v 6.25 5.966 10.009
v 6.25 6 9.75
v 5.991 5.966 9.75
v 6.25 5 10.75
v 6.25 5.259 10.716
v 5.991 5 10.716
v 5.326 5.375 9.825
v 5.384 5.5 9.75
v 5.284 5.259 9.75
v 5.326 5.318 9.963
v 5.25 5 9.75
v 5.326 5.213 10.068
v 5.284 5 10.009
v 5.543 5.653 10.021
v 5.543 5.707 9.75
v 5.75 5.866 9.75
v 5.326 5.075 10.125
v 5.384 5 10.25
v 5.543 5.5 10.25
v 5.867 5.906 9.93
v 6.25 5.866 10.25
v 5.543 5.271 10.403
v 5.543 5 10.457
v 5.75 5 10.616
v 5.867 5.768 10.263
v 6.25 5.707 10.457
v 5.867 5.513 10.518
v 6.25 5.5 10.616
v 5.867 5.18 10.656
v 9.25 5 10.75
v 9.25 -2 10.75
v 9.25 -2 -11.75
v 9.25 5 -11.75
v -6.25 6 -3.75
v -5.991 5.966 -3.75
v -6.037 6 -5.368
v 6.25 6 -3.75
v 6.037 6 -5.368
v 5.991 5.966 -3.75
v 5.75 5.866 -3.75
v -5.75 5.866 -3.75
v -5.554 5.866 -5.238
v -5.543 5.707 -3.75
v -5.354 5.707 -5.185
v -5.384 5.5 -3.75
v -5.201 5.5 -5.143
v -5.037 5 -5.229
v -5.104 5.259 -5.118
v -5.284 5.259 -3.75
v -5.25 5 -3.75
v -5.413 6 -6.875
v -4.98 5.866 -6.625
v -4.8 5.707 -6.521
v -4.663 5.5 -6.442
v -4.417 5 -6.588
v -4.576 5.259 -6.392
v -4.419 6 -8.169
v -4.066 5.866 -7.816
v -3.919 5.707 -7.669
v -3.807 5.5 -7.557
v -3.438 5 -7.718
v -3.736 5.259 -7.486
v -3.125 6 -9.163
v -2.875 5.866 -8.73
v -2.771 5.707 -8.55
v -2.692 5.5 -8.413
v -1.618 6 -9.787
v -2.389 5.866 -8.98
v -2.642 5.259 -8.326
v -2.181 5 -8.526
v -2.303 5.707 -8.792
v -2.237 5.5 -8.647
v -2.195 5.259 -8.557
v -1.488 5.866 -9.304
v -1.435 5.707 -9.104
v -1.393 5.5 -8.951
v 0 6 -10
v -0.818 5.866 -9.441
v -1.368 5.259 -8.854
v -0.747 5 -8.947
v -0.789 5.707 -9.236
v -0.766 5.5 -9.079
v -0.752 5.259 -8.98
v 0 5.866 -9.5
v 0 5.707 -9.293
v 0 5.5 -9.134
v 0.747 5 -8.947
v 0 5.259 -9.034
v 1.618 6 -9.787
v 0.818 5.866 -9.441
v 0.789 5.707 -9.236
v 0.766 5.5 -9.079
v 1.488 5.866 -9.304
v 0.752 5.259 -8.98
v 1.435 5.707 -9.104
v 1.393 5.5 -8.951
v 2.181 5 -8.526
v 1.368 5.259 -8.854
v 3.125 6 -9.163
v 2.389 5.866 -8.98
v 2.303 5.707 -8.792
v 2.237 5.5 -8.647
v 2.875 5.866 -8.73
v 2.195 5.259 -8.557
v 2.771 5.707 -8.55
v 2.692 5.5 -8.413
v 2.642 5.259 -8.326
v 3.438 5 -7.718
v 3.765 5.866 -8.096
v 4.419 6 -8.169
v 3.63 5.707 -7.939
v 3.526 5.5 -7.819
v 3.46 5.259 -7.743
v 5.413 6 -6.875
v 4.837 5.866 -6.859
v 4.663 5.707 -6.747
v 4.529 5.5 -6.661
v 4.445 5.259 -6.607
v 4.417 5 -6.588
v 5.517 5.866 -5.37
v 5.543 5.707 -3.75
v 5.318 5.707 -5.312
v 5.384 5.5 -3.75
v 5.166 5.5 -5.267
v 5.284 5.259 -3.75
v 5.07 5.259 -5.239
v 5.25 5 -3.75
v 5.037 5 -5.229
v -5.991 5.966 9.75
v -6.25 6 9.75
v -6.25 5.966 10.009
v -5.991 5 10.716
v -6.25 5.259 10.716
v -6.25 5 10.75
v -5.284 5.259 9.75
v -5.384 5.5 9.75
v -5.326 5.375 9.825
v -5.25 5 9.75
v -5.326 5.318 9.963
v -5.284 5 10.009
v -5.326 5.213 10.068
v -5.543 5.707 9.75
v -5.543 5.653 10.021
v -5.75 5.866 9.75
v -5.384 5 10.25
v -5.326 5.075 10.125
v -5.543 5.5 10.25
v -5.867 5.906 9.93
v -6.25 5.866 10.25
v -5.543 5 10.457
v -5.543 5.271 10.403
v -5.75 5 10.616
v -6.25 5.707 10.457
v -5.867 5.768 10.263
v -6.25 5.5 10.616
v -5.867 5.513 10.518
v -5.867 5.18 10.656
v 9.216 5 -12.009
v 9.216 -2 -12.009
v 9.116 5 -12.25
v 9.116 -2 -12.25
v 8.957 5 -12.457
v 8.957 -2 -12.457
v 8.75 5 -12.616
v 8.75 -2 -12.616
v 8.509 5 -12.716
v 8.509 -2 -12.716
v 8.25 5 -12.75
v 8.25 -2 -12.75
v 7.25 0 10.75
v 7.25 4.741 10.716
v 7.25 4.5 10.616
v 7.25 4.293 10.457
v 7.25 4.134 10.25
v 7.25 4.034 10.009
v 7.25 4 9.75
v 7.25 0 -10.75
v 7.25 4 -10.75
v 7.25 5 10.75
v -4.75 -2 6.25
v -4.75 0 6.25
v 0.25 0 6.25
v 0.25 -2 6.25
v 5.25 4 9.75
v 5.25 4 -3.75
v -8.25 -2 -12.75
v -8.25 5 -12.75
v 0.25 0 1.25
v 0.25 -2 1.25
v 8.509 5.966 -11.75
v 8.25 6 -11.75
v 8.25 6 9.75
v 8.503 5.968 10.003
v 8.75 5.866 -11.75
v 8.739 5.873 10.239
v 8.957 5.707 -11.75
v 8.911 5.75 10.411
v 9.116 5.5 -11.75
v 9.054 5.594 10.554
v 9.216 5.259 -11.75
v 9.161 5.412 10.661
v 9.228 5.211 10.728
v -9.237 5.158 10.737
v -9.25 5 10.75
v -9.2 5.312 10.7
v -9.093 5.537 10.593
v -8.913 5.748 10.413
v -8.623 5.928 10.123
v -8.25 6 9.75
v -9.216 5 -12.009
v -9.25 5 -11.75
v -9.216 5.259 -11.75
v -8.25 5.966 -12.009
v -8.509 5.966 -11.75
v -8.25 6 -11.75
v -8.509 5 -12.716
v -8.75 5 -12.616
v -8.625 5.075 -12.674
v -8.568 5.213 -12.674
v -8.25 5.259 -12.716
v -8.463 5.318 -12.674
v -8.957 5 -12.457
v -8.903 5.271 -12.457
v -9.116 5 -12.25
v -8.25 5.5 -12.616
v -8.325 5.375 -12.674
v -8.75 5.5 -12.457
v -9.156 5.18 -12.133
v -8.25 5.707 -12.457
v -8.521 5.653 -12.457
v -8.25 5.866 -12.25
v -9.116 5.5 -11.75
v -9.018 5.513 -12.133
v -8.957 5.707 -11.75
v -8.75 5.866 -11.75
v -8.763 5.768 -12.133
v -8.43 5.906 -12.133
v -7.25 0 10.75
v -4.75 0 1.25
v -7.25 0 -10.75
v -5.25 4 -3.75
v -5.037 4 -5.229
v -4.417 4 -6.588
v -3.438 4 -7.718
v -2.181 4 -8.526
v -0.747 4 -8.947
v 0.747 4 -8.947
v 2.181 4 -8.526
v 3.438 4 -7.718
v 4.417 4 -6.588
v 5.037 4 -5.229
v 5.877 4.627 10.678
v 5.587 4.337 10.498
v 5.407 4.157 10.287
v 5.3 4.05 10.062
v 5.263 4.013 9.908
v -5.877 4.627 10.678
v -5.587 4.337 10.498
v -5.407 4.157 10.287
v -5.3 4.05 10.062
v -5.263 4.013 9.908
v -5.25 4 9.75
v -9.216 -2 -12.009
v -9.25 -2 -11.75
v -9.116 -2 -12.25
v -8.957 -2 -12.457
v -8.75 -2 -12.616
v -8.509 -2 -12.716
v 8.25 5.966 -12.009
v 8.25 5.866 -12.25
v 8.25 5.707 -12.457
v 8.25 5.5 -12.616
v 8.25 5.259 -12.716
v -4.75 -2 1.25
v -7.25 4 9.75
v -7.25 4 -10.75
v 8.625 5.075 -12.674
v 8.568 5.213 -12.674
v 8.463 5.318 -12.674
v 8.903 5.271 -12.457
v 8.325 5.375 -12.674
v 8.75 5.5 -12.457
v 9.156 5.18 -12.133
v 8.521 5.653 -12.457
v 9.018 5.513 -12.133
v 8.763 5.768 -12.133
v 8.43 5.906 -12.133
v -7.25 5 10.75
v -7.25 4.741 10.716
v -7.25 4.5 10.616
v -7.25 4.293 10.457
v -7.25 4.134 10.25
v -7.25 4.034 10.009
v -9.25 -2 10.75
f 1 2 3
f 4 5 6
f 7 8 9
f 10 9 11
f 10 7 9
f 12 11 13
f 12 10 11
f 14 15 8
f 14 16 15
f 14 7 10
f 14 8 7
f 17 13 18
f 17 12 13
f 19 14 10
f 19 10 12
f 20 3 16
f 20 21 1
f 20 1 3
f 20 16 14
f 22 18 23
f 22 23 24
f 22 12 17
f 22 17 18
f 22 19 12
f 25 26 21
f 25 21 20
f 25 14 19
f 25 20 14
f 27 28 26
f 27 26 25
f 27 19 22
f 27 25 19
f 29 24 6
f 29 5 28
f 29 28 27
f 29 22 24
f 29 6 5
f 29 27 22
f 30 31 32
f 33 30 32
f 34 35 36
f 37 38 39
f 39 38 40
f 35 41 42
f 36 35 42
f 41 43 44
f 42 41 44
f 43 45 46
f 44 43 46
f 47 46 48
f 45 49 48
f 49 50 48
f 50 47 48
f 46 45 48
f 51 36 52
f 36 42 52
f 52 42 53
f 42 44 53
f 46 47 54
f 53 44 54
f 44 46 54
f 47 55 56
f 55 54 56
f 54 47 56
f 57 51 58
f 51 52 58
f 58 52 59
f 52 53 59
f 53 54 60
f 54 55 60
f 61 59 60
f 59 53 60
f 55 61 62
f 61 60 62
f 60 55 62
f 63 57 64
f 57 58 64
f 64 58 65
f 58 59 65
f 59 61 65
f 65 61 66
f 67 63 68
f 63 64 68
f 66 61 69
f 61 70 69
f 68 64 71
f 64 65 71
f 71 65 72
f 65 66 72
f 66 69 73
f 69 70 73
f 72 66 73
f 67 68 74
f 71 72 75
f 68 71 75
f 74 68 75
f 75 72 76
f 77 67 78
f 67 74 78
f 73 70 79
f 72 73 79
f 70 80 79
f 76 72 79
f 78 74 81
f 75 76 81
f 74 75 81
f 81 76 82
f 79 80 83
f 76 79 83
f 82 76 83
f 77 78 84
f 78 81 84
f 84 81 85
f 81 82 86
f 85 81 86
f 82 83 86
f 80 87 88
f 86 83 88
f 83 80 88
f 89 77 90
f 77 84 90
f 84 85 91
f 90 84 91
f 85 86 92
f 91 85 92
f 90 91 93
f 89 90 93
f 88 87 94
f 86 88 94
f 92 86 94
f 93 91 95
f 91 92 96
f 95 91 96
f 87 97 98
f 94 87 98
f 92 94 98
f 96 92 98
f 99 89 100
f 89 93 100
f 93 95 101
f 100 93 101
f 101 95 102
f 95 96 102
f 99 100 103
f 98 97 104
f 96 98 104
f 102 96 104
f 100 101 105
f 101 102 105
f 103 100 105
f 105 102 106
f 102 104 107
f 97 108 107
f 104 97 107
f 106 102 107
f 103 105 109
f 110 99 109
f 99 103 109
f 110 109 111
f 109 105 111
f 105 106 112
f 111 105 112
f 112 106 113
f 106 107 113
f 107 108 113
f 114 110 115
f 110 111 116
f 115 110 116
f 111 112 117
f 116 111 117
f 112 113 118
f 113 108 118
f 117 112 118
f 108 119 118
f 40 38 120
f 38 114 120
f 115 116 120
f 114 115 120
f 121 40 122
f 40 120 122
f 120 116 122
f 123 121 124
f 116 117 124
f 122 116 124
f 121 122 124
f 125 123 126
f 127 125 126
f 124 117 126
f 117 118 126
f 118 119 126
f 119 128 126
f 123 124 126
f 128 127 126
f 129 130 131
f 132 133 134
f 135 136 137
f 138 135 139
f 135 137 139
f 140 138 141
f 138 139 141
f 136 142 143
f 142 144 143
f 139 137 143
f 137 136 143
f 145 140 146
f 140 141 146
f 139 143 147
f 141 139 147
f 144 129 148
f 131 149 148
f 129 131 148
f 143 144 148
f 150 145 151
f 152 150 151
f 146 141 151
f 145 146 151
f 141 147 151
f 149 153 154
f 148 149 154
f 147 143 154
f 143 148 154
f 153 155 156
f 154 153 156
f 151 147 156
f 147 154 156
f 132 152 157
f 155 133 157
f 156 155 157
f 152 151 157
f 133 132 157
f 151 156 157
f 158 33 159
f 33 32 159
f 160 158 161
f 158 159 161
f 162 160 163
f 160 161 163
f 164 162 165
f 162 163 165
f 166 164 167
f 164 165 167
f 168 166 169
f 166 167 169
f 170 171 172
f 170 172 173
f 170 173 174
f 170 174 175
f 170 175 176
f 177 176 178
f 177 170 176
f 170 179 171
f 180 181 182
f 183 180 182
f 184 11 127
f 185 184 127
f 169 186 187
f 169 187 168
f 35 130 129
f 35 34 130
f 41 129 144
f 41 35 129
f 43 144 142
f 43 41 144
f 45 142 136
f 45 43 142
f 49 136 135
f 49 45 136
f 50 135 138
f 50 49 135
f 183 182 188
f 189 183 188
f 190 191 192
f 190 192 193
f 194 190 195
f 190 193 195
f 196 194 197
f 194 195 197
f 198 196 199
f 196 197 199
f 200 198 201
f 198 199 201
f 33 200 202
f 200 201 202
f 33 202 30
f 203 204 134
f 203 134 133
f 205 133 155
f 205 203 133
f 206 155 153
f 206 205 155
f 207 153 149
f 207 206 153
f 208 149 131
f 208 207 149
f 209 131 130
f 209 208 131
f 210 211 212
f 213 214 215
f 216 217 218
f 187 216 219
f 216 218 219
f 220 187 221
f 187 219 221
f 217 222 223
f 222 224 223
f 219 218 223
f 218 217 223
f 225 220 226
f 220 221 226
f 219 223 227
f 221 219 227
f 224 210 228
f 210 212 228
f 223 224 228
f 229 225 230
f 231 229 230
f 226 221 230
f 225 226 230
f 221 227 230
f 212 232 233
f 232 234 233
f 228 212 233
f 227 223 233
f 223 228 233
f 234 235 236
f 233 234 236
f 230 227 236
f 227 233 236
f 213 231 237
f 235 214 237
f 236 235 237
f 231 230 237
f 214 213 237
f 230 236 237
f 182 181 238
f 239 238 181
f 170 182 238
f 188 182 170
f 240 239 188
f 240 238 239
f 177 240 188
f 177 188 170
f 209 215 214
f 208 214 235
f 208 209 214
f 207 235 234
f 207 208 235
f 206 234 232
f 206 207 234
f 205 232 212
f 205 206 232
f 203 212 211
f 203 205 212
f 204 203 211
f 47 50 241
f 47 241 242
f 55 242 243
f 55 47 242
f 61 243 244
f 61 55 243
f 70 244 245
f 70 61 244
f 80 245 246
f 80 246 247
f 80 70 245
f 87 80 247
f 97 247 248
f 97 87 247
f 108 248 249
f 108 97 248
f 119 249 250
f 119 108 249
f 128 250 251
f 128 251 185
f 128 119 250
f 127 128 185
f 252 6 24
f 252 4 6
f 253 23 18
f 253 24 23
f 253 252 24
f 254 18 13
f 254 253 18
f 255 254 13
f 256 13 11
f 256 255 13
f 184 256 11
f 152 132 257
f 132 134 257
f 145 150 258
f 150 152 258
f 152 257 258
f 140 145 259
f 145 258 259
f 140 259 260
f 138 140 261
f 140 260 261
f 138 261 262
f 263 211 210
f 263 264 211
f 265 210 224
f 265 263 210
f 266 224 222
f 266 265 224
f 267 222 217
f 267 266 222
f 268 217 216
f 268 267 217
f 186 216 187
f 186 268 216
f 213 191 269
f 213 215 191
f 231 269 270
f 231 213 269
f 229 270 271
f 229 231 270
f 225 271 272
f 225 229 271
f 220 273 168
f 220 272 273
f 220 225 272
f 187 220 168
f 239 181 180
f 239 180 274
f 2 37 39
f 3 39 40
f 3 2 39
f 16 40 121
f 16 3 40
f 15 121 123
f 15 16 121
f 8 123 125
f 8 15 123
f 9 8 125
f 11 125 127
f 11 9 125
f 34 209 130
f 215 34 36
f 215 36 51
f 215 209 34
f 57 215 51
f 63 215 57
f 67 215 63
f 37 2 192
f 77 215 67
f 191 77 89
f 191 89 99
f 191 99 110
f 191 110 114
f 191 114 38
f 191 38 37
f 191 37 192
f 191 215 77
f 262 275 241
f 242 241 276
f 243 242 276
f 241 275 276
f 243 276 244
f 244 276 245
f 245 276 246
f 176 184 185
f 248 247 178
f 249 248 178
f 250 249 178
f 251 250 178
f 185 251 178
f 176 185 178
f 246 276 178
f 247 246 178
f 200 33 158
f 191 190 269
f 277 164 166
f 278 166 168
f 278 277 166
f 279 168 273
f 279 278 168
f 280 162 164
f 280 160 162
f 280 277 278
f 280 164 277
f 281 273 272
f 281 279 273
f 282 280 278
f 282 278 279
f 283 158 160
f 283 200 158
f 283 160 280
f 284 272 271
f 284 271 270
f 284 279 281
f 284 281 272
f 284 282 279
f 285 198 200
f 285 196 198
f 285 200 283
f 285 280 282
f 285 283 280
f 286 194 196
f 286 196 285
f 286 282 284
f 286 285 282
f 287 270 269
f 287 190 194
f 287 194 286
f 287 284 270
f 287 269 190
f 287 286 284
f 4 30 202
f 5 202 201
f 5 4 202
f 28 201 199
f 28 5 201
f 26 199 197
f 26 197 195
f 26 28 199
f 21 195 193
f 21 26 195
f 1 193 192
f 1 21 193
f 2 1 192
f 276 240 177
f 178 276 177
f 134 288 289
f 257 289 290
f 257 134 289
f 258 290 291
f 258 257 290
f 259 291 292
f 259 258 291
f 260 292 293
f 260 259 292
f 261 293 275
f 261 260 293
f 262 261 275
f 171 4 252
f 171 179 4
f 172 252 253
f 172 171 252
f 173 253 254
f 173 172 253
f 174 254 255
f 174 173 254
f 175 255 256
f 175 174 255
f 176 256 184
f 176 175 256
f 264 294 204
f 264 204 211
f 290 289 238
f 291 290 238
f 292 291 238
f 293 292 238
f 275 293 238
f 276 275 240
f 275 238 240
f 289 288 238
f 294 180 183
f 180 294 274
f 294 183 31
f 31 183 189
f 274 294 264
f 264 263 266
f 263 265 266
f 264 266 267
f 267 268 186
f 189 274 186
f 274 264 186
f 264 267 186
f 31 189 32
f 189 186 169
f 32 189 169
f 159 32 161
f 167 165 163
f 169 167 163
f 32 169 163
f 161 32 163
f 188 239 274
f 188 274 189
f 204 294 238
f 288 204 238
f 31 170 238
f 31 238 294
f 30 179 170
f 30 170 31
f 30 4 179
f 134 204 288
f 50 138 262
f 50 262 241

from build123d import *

# Parameters (mm, degrees)
SKETCH1_W           = 14.5
SKETCH1_H           = 21.5
BOSS_EXTRUDE1_DEPTH = 6
SHELL1_T            = 2
SKETCH3_W           = 2
SKETCH3_H           = 14.5
BOSS_EXTRUDE3_DEPTH = 2
SKETCH4_W           = 5
SKETCH4_H           = 5
CUT_EXTRUDE1_DEPTH  = 2
FILLET1_R           = 1


with BuildPart() as part:
    # Sketch1 → Boss-Extrude1 (new body)
    with BuildSketch(Plane(origin=(0, 0, 0), x_dir=(1, 0, 0), z_dir=(0, 1, 0))):
        Rectangle(SKETCH1_W, SKETCH1_H)
    extrude(amount=BOSS_EXTRUDE1_DEPTH)

    # Shell1
    shell1_openings = [part.faces().sort_by_distance(p)[0] for p in [
        (0, 3, 10.75),
        (0, 6, 0),
    ]]
    offset(amount=SHELL1_T, openings=shell1_openings, kind=Kind.INTERSECTION)

    # Sketch3 → Boss-Extrude3 (add)
    with BuildSketch(Plane(origin=(0, 6, 0), x_dir=(1, 0, 0), z_dir=(0, 1, 0))):
        with BuildLine():
            Line((-7.25, 10.75), (-7.25, 3.75))
            Line((-7.25, 3.75), (-5.25, 3.75))
            ThreePointArc((-5.25, 3.75), (0, 9), (5.25, 3.75))
            Line((5.25, 3.75), (7.25, 3.75))
            Line((7.25, 3.75), (7.25, 10.75))
            Line((7.25, 10.75), (-7.25, 10.75))
        make_face()
        with Locations((-6.25, -3.5)):
            Rectangle(SKETCH3_W, SKETCH3_H)
        with Locations((6.25, -3.5)):
            Rectangle(SKETCH3_W, SKETCH3_H)
    extrude(amount=-BOSS_EXTRUDE3_DEPTH)

    # Sketch4 → Cut-Extrude1 (cut)
    with BuildSketch(Plane(origin=(0, 0, 0), x_dir=(1, 0, 0), z_dir=(0, 1, 0))):
        with Locations((-2.25, -3.75)):
            Rectangle(SKETCH4_W, SKETCH4_H)
    extrude(amount=-CUT_EXTRUDE1_DEPTH, mode=Mode.SUBTRACT)

    # Fillet1
    fillet1_edges = [part.edges().sort_by_distance(p)[0] for p in [
        (-9.25, 6, -1),
        (-7.25, 6, 10.75),
        (7.25, 6, 10.75),
        (0, 6, -9),
        (-5.25, 6, 3.5),
        (-6.25, 4, 10.75),
        (-5.25, 5, 10.75),
        (5.25, 5, 10.75),
        (6.25, 4, 10.75),
        (5.25, 6, 3.5),
        (9.25, 6, -1),
        (-9.25, 2, -12.75),
        (9.25, 2, -12.75),
        (0, 6, -12.75),
    ]]
    fillet(fillet1_edges, radius=FILLET1_R - 0.0001)  # a hair under: the kernel refuses the full size


solid = part.part
